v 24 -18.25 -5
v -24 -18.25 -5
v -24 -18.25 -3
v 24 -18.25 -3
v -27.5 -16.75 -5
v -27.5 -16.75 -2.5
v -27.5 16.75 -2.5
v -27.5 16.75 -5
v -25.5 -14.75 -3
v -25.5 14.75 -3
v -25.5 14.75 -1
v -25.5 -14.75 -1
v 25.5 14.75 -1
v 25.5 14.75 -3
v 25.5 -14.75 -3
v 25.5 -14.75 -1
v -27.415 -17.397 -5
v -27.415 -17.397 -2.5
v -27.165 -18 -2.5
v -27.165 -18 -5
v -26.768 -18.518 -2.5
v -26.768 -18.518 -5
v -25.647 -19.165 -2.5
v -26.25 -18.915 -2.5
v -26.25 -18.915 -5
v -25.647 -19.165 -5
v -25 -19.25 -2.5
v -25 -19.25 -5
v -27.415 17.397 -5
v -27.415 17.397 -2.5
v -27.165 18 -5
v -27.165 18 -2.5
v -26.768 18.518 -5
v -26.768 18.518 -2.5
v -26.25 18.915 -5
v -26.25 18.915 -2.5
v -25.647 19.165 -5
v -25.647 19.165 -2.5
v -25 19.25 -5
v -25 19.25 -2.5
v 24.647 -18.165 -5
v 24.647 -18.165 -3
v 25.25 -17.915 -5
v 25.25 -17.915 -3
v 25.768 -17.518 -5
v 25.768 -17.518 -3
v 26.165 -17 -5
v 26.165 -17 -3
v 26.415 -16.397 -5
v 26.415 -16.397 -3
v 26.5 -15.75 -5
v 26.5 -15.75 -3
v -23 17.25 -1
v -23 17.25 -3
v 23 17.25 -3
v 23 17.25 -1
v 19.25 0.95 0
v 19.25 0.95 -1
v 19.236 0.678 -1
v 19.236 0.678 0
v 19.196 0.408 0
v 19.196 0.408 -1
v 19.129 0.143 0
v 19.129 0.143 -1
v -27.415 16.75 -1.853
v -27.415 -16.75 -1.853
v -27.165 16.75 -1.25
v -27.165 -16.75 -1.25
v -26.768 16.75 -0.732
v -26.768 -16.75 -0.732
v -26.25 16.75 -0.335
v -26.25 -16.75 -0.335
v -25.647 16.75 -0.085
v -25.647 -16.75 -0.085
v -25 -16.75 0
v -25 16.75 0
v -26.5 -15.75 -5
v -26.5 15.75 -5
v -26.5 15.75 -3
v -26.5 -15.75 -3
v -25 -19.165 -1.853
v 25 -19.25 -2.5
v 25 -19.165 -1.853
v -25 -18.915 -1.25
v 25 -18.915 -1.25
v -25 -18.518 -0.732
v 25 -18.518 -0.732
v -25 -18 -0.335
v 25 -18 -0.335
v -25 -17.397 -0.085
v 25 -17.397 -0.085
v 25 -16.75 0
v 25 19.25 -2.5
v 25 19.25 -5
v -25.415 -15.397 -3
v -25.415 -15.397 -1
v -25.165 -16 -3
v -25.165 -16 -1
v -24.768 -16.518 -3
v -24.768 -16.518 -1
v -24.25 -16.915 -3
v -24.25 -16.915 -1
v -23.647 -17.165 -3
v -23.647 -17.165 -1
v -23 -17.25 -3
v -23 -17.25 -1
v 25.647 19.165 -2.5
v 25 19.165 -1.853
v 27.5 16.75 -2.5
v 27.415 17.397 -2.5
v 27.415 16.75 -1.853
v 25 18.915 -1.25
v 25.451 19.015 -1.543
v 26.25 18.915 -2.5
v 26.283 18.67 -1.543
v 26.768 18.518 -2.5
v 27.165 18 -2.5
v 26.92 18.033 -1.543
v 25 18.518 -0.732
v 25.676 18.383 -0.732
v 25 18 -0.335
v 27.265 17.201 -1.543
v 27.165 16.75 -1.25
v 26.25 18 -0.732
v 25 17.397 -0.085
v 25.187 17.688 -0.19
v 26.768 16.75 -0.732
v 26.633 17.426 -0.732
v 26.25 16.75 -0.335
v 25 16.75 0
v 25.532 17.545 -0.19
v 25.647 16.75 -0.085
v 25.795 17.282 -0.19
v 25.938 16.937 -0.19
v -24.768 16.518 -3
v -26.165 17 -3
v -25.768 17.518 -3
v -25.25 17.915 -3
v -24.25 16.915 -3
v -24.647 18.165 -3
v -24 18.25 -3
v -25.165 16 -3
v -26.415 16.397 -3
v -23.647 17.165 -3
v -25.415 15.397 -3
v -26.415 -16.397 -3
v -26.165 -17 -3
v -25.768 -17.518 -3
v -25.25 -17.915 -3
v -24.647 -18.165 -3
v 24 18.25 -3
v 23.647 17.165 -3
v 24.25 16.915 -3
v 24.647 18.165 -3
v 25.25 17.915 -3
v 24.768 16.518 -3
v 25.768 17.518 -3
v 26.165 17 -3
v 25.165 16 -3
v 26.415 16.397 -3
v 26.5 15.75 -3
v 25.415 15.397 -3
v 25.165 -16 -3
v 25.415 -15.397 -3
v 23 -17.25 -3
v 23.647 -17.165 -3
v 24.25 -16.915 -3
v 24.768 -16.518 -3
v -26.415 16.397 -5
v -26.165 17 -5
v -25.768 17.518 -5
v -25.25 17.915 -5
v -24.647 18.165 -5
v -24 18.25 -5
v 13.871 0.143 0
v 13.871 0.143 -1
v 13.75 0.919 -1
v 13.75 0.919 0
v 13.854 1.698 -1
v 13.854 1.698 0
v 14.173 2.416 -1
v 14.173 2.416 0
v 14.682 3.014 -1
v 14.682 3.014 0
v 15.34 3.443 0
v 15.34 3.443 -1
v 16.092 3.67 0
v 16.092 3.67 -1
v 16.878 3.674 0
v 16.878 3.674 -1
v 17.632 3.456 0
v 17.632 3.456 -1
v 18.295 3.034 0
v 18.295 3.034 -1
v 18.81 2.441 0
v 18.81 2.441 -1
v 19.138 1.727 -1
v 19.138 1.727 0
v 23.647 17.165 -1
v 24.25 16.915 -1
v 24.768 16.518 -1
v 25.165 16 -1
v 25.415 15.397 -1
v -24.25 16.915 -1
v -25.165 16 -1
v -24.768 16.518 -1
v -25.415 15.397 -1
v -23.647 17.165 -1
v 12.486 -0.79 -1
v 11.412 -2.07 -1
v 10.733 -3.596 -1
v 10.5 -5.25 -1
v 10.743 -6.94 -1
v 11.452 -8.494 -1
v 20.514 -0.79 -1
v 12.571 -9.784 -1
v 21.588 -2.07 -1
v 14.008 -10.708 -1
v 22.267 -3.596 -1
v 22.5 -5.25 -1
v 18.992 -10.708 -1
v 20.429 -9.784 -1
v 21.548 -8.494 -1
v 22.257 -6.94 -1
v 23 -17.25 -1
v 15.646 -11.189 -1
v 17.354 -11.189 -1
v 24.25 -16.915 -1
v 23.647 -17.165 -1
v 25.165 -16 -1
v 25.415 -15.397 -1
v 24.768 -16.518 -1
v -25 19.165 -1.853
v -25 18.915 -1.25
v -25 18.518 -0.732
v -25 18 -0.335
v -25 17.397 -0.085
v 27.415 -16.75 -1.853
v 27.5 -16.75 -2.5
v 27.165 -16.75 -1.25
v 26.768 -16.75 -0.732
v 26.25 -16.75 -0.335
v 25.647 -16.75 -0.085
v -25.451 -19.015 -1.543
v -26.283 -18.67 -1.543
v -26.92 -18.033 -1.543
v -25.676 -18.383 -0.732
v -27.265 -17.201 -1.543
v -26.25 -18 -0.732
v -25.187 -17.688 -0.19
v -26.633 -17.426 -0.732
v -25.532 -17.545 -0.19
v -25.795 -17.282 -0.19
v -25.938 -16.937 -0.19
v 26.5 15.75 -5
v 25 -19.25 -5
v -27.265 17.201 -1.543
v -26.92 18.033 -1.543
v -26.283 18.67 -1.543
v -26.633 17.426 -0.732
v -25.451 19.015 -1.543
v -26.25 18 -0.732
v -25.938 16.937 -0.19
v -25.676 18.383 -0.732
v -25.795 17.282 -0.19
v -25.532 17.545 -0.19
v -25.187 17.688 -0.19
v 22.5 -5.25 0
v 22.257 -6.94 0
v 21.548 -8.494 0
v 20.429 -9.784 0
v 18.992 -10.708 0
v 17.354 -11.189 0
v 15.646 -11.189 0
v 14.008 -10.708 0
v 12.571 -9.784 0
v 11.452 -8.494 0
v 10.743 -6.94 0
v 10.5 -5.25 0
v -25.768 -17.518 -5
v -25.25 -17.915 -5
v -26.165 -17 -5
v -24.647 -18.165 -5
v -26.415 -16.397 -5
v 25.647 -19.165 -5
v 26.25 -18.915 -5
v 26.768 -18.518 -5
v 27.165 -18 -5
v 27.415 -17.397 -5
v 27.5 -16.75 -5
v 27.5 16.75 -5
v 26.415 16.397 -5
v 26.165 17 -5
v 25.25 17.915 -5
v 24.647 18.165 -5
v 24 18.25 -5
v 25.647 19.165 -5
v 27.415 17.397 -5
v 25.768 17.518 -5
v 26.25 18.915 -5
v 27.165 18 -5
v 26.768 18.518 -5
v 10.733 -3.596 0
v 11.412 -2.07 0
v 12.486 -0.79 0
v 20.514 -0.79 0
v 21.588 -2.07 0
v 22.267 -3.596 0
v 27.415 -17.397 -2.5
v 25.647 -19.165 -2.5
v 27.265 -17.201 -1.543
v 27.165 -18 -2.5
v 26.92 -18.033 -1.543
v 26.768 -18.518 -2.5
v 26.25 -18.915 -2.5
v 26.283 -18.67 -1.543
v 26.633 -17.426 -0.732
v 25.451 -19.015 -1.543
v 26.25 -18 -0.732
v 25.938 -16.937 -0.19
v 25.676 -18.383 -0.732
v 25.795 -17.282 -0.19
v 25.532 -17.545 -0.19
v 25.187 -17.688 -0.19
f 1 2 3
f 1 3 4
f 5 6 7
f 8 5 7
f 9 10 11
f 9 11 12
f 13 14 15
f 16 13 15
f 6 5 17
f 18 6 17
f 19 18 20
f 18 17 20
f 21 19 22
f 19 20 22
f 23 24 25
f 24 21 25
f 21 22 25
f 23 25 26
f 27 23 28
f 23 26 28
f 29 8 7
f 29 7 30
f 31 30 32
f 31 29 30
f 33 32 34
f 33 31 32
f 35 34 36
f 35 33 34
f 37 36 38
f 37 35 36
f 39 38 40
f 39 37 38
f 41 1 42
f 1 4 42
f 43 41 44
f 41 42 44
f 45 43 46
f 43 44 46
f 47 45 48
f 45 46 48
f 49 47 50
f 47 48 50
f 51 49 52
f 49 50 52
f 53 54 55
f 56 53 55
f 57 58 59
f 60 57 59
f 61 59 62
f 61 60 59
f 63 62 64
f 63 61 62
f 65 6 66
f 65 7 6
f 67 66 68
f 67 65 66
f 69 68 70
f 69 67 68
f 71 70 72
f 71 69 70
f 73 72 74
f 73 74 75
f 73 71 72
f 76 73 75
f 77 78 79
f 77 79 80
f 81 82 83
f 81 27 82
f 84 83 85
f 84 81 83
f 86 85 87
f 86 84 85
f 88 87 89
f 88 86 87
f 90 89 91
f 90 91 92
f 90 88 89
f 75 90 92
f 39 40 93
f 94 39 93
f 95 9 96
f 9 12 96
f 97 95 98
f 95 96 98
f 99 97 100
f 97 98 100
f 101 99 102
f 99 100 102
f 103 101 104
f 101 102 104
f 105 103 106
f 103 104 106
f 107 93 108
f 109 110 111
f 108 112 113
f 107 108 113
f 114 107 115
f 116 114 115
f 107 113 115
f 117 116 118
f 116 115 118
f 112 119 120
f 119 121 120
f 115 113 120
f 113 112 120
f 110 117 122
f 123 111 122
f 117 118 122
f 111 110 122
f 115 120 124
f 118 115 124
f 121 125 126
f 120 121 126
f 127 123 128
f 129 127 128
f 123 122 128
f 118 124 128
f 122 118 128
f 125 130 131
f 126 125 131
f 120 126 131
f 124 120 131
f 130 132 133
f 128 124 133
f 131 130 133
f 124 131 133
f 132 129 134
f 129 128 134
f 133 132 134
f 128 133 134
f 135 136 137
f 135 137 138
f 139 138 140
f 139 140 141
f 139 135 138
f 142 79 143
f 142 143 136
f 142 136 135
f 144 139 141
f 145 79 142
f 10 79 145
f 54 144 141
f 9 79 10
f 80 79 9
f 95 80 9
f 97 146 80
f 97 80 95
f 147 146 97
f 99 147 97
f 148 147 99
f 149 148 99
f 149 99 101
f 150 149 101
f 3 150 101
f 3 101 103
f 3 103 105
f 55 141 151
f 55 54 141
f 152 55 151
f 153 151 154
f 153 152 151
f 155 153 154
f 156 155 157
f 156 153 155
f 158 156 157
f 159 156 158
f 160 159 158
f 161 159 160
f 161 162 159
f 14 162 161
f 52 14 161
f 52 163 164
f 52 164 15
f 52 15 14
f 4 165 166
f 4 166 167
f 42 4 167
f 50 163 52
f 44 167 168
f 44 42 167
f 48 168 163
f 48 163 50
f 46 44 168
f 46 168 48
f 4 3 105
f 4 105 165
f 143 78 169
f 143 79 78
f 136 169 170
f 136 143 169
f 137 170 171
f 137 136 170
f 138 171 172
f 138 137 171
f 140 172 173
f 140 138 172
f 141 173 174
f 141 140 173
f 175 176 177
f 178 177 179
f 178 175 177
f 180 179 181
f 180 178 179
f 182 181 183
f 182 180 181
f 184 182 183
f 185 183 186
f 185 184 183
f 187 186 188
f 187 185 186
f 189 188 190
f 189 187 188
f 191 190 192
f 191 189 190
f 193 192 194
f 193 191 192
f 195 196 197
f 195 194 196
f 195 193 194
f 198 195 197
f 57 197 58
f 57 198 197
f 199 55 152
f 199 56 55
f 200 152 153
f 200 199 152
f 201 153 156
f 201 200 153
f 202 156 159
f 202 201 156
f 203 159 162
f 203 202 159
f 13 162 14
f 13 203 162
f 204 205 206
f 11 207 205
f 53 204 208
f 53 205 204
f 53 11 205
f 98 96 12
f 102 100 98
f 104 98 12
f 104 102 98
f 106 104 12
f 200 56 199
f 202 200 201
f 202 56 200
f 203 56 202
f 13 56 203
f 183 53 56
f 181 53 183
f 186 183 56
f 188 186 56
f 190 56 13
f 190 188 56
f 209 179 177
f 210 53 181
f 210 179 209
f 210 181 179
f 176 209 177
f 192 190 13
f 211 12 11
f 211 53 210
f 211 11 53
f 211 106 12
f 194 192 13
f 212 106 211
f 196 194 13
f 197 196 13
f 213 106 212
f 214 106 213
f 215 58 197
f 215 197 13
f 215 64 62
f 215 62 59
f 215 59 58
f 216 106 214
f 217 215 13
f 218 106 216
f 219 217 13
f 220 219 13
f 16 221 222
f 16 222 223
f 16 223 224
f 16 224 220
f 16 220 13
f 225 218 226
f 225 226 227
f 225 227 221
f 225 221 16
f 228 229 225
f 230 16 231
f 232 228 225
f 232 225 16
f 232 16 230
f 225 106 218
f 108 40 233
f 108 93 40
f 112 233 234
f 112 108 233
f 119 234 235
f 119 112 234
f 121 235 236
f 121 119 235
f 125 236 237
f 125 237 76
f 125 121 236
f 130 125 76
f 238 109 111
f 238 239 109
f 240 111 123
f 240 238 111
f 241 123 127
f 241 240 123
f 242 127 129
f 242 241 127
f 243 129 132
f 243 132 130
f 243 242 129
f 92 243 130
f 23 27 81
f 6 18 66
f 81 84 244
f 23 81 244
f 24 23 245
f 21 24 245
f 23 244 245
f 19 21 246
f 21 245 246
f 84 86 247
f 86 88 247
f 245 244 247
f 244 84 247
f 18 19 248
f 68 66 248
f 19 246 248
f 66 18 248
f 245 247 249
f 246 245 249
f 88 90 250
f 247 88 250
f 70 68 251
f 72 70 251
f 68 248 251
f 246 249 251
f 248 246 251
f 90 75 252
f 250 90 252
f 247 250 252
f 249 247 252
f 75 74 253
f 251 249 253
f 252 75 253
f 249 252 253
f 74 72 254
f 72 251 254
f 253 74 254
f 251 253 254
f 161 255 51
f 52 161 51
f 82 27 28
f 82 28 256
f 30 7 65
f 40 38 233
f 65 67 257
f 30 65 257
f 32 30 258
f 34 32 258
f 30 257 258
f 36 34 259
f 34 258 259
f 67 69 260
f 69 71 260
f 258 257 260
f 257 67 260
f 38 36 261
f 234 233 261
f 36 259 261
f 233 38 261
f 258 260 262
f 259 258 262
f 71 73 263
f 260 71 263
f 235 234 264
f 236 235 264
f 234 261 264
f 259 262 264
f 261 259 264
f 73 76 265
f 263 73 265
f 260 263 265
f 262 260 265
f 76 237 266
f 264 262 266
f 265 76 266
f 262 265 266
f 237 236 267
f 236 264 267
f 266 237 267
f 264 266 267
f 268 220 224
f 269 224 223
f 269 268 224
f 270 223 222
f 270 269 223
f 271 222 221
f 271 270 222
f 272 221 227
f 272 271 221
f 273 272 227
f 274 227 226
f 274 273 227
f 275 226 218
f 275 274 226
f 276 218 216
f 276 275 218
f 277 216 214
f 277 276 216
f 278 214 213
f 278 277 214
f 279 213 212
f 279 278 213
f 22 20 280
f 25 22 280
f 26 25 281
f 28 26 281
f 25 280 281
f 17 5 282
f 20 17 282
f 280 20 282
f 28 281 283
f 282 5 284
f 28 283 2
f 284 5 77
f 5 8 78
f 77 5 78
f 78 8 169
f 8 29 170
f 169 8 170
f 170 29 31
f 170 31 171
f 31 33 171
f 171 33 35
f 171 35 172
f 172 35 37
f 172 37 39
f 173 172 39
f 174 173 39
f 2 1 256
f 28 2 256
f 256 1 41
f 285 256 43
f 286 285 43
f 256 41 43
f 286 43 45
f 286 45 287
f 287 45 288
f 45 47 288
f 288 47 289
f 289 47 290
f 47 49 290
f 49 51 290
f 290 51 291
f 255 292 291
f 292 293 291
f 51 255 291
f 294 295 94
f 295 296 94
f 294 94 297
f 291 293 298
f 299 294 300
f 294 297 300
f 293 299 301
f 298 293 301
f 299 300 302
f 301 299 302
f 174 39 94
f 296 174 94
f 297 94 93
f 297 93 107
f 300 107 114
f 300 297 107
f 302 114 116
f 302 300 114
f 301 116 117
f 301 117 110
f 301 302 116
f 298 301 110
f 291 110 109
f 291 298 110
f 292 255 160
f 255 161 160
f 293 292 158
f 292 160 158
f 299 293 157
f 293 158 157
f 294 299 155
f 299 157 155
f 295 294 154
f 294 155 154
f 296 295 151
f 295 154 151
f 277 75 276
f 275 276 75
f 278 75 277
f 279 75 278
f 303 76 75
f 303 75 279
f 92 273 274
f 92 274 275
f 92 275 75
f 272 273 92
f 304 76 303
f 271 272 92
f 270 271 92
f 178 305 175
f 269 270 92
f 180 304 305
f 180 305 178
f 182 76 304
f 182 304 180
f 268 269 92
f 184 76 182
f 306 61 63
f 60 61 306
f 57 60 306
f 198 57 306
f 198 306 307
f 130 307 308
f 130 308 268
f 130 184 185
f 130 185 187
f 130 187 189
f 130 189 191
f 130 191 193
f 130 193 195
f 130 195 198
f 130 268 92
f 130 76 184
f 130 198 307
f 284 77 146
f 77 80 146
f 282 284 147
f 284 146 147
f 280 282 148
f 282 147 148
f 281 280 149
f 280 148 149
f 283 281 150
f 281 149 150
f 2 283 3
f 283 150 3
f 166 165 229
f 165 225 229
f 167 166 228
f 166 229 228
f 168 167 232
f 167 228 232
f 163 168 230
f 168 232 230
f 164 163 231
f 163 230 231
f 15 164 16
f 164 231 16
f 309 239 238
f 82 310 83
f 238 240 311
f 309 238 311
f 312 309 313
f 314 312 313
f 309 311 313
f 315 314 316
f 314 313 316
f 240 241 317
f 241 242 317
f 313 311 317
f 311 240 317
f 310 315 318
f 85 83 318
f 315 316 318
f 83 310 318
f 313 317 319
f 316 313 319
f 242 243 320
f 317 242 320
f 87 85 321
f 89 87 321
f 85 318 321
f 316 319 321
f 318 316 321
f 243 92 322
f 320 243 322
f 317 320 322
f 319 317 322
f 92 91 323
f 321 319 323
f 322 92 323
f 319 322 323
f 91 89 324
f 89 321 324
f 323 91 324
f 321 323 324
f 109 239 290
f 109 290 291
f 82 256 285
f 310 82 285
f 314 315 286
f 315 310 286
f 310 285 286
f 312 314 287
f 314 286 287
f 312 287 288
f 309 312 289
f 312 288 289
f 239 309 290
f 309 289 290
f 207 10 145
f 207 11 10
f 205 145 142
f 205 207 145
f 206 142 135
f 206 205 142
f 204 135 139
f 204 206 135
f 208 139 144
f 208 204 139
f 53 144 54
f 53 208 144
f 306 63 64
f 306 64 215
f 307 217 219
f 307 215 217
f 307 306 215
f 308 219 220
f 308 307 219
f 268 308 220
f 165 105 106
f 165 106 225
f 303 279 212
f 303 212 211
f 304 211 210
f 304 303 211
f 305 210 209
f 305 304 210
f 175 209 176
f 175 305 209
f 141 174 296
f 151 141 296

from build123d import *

# Parameters (mm, degrees)
F0_W     = 55
F0_H     = 38.5
F1_DEPTH = 5
F2_W     = 51
F2_H     = 34.5
F3_DEPTH = 4
F2_W_2   = 53
F2_H_2   = 36.5
F4_DEPTH = 2
F5_R     = 2.5
F6_R     = 2.5


with BuildPart() as f1:
    # F0 (on Top) → F1 (new body)
    with BuildSketch(Plane.XY):
        Rectangle(F0_W, F0_H)
        with BuildLine():
            ThreePointArc((22.5, -5.25), (16.5, -11.25), (10.5, -5.25))
            ThreePointArc((10.5, -5.25), (11.4120636058, -2.0699208738), (13.8709677497, 0.1433467742))
            ThreePointArc((13.8709677497, 0.1433467742), (16.0921634448, 3.6695899221), (19.25, 0.95))
            ThreePointArc((19.25, 0.95), (19.2195899221, 0.5421634448), (19.1290322503, 0.1433467742))
            ThreePointArc((19.1290322503, 0.1433467742), (21.5879363942, -2.0699208738), (22.5, -5.25))
        make_face(mode=Mode.SUBTRACT)
    extrude(amount=-F1_DEPTH)

    # F2 (on face) → F3 (cut)
    with BuildSketch(Plane(origin=(0, 0, -5), x_dir=(1, 0, 0), z_dir=(0, 0, -1))):
        Rectangle(F2_W, F2_H)
        with BuildLine():
            ThreePointArc((13.8709677497, -0.1433467742), (11.4120636058, 2.0699208738), (10.5, 5.25))
            ThreePointArc((10.5, 5.25), (19.6800791262, 10.3379363942), (19.1290322503, -0.1433467742))
            ThreePointArc((19.1290322503, -0.1433467742), (19.2195899221, -0.5421634448), (19.25, -0.95))
            ThreePointArc((19.25, -0.95), (16.0921634448, -3.6695899221), (13.8709677497, -0.1433467742))
        make_face(mode=Mode.SUBTRACT)
    extrude(amount=-F3_DEPTH, mode=Mode.SUBTRACT)

    # F2 (on face) → F4 (cut)
    with BuildSketch(Plane(origin=(0, 0, -5), x_dir=(1, 0, 0), z_dir=(0, 0, -1))):
        Rectangle(F2_W_2, F2_H_2)
        Rectangle(F2_W, F2_H, mode=Mode.SUBTRACT)
    extrude(amount=-F4_DEPTH, mode=Mode.SUBTRACT)

    # F5
    f5_edges = [f1.edges().sort_by_distance(p)[0] for p in [
        (-27.5, 19.25, -2.5),
        (-26.5, 18.25, -4),
        (-25.5, 17.25, -2),
        (-27.5, -19.25, -2.5),
        (-26.5, -18.25, -4),
        (-25.5, -17.25, -2),
        (27.5, -19.25, -2.5),
        (27.5, 19.25, -2.5),
        (26.5, -18.25, -4),
        (25.5, -17.25, -2),
        (26.5, 18.25, -4),
        (25.5, 17.25, -2),
    ]]
    fillet(f5_edges, radius=F5_R)

    # F6
    f6_edges = [f1.edges().sort_by_distance(p)[0] for p in [
        (-27.5, 0, 0),
    ]]
    fillet(f6_edges, radius=F6_R)


solid = f1.part
